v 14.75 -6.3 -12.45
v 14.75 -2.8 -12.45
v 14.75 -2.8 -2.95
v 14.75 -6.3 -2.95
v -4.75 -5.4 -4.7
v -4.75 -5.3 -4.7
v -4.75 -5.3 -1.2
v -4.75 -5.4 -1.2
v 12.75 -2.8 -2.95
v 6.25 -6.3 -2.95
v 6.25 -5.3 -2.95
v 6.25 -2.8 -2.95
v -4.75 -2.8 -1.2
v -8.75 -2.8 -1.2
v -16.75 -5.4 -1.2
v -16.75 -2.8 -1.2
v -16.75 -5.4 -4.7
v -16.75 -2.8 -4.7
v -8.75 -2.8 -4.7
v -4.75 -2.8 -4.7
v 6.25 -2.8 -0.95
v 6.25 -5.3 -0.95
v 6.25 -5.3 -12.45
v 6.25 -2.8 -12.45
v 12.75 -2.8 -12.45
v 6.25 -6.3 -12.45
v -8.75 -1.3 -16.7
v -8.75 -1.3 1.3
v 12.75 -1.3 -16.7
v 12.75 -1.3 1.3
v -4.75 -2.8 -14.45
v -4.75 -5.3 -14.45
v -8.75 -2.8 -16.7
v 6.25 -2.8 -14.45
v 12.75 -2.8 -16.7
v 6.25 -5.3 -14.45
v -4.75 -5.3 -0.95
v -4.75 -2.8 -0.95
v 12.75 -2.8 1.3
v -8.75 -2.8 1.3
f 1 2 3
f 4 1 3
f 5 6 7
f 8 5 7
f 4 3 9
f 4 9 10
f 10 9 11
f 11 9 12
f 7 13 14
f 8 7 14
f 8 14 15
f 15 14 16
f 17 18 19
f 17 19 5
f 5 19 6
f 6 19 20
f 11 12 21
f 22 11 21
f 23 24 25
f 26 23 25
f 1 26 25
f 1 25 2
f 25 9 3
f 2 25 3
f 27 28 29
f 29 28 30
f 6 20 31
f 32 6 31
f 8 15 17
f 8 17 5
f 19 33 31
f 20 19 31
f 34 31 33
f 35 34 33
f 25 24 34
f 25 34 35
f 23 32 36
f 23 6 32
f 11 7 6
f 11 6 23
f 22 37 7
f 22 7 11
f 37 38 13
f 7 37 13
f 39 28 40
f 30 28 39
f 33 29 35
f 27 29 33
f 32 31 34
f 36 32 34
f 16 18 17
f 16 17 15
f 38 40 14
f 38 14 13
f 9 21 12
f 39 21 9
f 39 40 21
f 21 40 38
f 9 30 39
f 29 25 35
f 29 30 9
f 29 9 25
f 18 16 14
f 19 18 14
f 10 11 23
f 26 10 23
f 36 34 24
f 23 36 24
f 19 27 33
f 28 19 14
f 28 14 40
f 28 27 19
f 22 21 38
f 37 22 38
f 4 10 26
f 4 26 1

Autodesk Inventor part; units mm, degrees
ref_plane "YZ Plane" through (0, 0, 0) normal (1, 0, 0) x (0, 1, 0)
ref_plane "XZ Plane" through (0, 0, 0) normal (0, 1, 0) x (-1, 0, 0)
ref_plane "РабПлоскость1" through (-8.75, -1.3, -1.3) normal (0, -1, 0) x (1, 0, 0)
sketch "Эскиз1" plane through (-8.75, -1.3, -1.3) normal (0, -1, 0) x (1, 0, 0)
  line L0 (21.5, -15.4) -> (0, -15.4)
  line L1 (0, -15.4) -> (0, 2.6)
  line L2 (0, 2.6) -> (21.5, 2.6)
  line L3 (21.5, 2.6) -> (21.5, -15.4)
  point P0 (8.75, 1.3)
  point P1 (0, 2.6)
  dimension "d0" = 21.5
  dimension "d1" = 18
extrude "Выдавливание1" add sketch "Эскиз1" along normal blind 1.5
sketch "Эскиз2" plane through (-8.75, -2.8, -1.3) normal (0, -1, 0) x (1, 0, 0)
  line L0 (21.5, -15.4) -> (21.5, 2.6) projected
  line L1 (23.5, -1.65) -> (15, -1.65)
  line L2 (15, -1.65) -> (15, -11.15)
  line L3 (15, -11.15) -> (23.5, -11.15)
  line L4 (23.5, -11.15) -> (23.5, -1.65)
  point P0 (8.75, 1.3)
  point P1 (15, -6.4)
  point P2 (21.5, -6.4)
  dimension "d17" = 8.5
  dimension "d18" = 9.5
  dimension "d19" = 6.5
extrude "Выдавливание2" add sketch "Эскиз2" along normal blind 3.5
ref_plane "РабПлоскость2" through (-8.75, -1.3, -7.7) normal (0, 0, 1) x (1, 0, 0)
sketch "Эскиз4" plane through (-8.75, -2.8, -1.3) normal (0, -1, 0) x (1, 0, 0)
  line L0 (15, 0.35) -> (4, 0.35)
  line L1 (4, 0.35) -> (4, -13.15)
  line L2 (4, -13.15) -> (15, -13.15)
  line L3 (15, -13.15) -> (15, 0.35)
  line L4 (0, 2.6) -> (0, -15.4) projected
  point P0 (8.75, 1.3)
  point P1 (15, -6.4)
  point P2 (0, -6.4)
  dimension "d20" = 11
  dimension "d21" = 13.5
  dimension "d22" = 15
extrude "Выдавливание4" add sketch "Эскиз4" along normal blind 2.5
sketch "Эскиз5" plane through (-8.75, -2.8, -1.3) normal (0, -1, 0) x (1, 0, 0)
  line L0 (-1, -3.4) -> (4, -3.4)
  line L1 (4, -3.4) -> (4, 0.1)
  line L2 (4, 0.1) -> (-1, 0.1)
  line L3 (-1, 0.1) -> (-1, -3.4)
  line L4 (21.5, 2.6) -> (0, 2.6) projected
  line L5 (4, 0.35) -> (4, -13.15) projected
  point P0 (8.75, 1.3)
  point P1 (4, -1.65)
  point P2 (4, -6.4)
  dimension "d25" = 5
  dimension "d26" = 3.5
  dimension "d27" = 6
extrude "Выдавливание5" add sketch "Эскиз5" along normal blind 2.6
sketch "Эскиз6" plane through (-9.75, -2.8, -4.7) normal (-1, 0, 0) x (0, 0, 1)
  circle A0 centre (1.75, -1.3) radius 1
  line L0 (3.5, -2.6) -> (0, -2.6) projected
  line L1 (3.5, 0) -> (3.5, -2.6) projected
  line L2 (3.5, 0) -> (0, 0) projected
  line L3 (0, 0) -> (0, -2.6) projected
  point P0 (4.7, 2.8)
  point P1 (1.75, -2.6)
  point P2 (3.5, -1.3)
  dimension "d30" = 2
extrude "Выдавливание6" add sketch "Эскиз6" along normal blind 7 contours A0 | L0 L3 L2 L1
properties part number "ЛЦМК0000002.00.00.00.00.03"
